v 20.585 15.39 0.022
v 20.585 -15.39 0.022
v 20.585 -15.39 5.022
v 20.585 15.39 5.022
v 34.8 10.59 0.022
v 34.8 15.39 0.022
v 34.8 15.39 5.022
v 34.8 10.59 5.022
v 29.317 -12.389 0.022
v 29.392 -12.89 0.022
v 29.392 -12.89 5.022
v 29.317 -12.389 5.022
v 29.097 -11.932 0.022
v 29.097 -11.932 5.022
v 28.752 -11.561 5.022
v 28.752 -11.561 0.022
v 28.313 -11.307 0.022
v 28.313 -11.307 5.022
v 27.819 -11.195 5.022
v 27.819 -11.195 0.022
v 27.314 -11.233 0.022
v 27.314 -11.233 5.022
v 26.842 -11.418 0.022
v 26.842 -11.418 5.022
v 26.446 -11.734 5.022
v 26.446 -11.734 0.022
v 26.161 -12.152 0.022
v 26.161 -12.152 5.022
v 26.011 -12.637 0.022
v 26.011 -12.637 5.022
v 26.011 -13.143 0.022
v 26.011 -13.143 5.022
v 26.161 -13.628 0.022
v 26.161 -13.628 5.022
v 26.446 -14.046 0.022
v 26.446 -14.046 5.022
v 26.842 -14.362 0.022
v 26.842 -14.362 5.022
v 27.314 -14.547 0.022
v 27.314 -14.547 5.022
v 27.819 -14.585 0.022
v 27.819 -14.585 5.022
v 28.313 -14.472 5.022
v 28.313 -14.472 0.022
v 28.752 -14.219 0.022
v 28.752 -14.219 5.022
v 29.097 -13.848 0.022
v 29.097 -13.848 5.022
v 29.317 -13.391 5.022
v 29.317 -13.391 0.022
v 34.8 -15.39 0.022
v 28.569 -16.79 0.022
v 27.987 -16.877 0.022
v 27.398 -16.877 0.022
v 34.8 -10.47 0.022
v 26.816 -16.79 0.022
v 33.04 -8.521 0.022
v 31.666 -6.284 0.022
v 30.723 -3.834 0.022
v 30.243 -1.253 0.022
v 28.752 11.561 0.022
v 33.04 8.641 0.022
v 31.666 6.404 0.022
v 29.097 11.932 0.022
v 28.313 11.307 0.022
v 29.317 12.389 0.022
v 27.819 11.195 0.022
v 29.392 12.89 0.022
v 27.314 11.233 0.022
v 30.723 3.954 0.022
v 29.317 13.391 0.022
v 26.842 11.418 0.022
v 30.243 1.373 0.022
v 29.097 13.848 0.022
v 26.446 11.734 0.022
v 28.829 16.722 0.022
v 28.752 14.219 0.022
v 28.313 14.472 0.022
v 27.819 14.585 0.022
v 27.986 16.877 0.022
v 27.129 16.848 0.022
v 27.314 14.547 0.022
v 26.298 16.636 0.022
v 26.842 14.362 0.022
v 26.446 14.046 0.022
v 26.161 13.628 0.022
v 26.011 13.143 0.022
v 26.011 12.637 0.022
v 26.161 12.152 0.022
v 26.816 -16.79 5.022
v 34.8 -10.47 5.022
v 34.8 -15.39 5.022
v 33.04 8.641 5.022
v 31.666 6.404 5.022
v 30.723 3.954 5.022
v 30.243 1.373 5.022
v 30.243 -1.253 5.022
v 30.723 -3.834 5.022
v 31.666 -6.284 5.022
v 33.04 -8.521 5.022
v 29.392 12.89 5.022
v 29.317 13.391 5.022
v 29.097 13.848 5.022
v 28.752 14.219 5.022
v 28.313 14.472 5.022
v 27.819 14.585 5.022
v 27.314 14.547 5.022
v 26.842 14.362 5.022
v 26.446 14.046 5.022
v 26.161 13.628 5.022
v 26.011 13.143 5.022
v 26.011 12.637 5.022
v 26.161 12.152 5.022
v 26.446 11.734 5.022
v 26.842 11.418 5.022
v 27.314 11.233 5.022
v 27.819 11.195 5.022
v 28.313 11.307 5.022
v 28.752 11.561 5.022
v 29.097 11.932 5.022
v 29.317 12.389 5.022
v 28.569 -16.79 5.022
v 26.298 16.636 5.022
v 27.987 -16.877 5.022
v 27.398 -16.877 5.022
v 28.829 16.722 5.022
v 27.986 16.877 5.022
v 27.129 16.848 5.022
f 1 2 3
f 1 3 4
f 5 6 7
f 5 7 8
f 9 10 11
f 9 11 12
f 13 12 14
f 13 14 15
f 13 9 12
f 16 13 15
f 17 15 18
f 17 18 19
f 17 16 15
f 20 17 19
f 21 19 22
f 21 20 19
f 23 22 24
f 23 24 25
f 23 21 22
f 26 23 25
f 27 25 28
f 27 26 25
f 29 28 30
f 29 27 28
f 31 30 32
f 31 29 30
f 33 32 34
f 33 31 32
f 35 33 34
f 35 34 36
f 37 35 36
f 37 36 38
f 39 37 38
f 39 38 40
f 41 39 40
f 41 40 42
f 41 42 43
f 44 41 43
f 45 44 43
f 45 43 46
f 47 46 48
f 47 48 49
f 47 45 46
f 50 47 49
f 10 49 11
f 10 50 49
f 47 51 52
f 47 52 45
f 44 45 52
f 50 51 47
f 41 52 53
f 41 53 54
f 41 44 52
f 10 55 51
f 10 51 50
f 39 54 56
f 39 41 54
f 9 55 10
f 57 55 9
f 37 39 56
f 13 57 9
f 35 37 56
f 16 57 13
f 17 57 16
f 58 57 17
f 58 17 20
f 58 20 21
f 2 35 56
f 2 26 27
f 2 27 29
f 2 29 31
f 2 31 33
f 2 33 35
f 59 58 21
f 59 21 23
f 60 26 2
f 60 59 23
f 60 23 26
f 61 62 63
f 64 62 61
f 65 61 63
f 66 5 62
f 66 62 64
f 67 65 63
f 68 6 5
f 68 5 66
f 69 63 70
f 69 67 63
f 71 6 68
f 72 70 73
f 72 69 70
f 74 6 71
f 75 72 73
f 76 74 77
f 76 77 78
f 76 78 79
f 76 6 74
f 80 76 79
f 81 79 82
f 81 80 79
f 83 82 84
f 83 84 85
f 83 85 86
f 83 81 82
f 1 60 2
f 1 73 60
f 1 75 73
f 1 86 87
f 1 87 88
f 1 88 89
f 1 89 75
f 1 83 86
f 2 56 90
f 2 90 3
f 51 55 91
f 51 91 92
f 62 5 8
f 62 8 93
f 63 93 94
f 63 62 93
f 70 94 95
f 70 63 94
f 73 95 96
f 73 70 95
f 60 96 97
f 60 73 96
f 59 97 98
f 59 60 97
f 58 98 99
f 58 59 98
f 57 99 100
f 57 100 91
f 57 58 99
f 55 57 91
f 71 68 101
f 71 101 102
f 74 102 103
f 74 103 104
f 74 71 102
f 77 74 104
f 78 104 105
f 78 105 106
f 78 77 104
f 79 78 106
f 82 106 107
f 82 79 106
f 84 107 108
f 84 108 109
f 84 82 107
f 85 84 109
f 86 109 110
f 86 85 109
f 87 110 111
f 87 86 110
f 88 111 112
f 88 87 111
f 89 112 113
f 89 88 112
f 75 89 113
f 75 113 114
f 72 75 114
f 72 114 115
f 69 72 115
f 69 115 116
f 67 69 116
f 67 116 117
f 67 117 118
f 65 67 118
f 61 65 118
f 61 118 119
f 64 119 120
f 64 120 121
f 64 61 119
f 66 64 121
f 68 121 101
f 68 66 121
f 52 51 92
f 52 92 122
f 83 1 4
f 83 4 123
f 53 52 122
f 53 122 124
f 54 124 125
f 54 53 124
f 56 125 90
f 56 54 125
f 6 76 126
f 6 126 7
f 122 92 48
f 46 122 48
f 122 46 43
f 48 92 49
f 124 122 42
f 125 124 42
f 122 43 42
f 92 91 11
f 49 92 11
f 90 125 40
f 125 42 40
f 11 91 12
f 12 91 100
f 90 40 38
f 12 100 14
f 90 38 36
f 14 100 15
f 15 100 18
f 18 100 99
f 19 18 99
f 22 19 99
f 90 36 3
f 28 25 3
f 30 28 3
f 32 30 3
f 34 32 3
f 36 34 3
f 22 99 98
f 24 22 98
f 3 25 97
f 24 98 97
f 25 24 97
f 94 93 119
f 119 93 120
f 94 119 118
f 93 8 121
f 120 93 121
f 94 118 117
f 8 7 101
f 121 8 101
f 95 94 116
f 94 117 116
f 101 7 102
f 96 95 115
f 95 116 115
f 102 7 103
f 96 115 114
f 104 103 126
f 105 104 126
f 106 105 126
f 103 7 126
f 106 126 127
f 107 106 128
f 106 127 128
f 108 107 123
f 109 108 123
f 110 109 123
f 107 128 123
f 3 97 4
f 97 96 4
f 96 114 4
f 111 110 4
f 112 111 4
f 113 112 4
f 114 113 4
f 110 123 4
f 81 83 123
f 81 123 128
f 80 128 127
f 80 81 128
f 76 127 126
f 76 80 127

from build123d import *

# Parameters (mm, degrees)
SKETCH2_R           = 1.7
BOSS_EXTRUDE1_DEPTH = 5


with BuildPart() as part:
    # Sketch2 → Boss-Extrude1 (new body)
    with BuildSketch(Plane.XY.offset(0.022274507)):
        with BuildLine():
            Line((26.815853016, -16.790117538), (20.584977895, -15.389970557))
            Line((20.584977895, -15.389970557), (20.584977895, 15.389970557))
            Line((20.584977895, 15.389970557), (26.298427654, 16.636497968))
            ThreePointArc((26.298427654, 16.636497968), (27.556656853, 16.885073389), (28.828845221, 16.722385915))
            Line((28.828845221, 16.722385915), (34.799540996, 15.389970557))
            Line((34.799540996, 15.389970557), (34.799540996, 10.589698359))
            ThreePointArc((34.799540996, 10.589698359), (30.183127704, 0.060029443), (34.799540996, -10.469639472))
            Line((34.799540996, -10.469639472), (34.799540996, -15.389970557))
            Line((34.799540996, -15.389970557), (28.568665876, -16.790117538))
            ThreePointArc((28.568665876, -16.790117538), (27.692259446, -16.887374052), (26.815853016, -16.790117538))
        make_face()
        with Locations((27.692259446, -12.889970557)):
            Circle(SKETCH2_R, mode=Mode.SUBTRACT)
        with Locations((27.692259446, 12.889970557)):
            Circle(SKETCH2_R, mode=Mode.SUBTRACT)
    extrude(amount=BOSS_EXTRUDE1_DEPTH)


solid = part.part
